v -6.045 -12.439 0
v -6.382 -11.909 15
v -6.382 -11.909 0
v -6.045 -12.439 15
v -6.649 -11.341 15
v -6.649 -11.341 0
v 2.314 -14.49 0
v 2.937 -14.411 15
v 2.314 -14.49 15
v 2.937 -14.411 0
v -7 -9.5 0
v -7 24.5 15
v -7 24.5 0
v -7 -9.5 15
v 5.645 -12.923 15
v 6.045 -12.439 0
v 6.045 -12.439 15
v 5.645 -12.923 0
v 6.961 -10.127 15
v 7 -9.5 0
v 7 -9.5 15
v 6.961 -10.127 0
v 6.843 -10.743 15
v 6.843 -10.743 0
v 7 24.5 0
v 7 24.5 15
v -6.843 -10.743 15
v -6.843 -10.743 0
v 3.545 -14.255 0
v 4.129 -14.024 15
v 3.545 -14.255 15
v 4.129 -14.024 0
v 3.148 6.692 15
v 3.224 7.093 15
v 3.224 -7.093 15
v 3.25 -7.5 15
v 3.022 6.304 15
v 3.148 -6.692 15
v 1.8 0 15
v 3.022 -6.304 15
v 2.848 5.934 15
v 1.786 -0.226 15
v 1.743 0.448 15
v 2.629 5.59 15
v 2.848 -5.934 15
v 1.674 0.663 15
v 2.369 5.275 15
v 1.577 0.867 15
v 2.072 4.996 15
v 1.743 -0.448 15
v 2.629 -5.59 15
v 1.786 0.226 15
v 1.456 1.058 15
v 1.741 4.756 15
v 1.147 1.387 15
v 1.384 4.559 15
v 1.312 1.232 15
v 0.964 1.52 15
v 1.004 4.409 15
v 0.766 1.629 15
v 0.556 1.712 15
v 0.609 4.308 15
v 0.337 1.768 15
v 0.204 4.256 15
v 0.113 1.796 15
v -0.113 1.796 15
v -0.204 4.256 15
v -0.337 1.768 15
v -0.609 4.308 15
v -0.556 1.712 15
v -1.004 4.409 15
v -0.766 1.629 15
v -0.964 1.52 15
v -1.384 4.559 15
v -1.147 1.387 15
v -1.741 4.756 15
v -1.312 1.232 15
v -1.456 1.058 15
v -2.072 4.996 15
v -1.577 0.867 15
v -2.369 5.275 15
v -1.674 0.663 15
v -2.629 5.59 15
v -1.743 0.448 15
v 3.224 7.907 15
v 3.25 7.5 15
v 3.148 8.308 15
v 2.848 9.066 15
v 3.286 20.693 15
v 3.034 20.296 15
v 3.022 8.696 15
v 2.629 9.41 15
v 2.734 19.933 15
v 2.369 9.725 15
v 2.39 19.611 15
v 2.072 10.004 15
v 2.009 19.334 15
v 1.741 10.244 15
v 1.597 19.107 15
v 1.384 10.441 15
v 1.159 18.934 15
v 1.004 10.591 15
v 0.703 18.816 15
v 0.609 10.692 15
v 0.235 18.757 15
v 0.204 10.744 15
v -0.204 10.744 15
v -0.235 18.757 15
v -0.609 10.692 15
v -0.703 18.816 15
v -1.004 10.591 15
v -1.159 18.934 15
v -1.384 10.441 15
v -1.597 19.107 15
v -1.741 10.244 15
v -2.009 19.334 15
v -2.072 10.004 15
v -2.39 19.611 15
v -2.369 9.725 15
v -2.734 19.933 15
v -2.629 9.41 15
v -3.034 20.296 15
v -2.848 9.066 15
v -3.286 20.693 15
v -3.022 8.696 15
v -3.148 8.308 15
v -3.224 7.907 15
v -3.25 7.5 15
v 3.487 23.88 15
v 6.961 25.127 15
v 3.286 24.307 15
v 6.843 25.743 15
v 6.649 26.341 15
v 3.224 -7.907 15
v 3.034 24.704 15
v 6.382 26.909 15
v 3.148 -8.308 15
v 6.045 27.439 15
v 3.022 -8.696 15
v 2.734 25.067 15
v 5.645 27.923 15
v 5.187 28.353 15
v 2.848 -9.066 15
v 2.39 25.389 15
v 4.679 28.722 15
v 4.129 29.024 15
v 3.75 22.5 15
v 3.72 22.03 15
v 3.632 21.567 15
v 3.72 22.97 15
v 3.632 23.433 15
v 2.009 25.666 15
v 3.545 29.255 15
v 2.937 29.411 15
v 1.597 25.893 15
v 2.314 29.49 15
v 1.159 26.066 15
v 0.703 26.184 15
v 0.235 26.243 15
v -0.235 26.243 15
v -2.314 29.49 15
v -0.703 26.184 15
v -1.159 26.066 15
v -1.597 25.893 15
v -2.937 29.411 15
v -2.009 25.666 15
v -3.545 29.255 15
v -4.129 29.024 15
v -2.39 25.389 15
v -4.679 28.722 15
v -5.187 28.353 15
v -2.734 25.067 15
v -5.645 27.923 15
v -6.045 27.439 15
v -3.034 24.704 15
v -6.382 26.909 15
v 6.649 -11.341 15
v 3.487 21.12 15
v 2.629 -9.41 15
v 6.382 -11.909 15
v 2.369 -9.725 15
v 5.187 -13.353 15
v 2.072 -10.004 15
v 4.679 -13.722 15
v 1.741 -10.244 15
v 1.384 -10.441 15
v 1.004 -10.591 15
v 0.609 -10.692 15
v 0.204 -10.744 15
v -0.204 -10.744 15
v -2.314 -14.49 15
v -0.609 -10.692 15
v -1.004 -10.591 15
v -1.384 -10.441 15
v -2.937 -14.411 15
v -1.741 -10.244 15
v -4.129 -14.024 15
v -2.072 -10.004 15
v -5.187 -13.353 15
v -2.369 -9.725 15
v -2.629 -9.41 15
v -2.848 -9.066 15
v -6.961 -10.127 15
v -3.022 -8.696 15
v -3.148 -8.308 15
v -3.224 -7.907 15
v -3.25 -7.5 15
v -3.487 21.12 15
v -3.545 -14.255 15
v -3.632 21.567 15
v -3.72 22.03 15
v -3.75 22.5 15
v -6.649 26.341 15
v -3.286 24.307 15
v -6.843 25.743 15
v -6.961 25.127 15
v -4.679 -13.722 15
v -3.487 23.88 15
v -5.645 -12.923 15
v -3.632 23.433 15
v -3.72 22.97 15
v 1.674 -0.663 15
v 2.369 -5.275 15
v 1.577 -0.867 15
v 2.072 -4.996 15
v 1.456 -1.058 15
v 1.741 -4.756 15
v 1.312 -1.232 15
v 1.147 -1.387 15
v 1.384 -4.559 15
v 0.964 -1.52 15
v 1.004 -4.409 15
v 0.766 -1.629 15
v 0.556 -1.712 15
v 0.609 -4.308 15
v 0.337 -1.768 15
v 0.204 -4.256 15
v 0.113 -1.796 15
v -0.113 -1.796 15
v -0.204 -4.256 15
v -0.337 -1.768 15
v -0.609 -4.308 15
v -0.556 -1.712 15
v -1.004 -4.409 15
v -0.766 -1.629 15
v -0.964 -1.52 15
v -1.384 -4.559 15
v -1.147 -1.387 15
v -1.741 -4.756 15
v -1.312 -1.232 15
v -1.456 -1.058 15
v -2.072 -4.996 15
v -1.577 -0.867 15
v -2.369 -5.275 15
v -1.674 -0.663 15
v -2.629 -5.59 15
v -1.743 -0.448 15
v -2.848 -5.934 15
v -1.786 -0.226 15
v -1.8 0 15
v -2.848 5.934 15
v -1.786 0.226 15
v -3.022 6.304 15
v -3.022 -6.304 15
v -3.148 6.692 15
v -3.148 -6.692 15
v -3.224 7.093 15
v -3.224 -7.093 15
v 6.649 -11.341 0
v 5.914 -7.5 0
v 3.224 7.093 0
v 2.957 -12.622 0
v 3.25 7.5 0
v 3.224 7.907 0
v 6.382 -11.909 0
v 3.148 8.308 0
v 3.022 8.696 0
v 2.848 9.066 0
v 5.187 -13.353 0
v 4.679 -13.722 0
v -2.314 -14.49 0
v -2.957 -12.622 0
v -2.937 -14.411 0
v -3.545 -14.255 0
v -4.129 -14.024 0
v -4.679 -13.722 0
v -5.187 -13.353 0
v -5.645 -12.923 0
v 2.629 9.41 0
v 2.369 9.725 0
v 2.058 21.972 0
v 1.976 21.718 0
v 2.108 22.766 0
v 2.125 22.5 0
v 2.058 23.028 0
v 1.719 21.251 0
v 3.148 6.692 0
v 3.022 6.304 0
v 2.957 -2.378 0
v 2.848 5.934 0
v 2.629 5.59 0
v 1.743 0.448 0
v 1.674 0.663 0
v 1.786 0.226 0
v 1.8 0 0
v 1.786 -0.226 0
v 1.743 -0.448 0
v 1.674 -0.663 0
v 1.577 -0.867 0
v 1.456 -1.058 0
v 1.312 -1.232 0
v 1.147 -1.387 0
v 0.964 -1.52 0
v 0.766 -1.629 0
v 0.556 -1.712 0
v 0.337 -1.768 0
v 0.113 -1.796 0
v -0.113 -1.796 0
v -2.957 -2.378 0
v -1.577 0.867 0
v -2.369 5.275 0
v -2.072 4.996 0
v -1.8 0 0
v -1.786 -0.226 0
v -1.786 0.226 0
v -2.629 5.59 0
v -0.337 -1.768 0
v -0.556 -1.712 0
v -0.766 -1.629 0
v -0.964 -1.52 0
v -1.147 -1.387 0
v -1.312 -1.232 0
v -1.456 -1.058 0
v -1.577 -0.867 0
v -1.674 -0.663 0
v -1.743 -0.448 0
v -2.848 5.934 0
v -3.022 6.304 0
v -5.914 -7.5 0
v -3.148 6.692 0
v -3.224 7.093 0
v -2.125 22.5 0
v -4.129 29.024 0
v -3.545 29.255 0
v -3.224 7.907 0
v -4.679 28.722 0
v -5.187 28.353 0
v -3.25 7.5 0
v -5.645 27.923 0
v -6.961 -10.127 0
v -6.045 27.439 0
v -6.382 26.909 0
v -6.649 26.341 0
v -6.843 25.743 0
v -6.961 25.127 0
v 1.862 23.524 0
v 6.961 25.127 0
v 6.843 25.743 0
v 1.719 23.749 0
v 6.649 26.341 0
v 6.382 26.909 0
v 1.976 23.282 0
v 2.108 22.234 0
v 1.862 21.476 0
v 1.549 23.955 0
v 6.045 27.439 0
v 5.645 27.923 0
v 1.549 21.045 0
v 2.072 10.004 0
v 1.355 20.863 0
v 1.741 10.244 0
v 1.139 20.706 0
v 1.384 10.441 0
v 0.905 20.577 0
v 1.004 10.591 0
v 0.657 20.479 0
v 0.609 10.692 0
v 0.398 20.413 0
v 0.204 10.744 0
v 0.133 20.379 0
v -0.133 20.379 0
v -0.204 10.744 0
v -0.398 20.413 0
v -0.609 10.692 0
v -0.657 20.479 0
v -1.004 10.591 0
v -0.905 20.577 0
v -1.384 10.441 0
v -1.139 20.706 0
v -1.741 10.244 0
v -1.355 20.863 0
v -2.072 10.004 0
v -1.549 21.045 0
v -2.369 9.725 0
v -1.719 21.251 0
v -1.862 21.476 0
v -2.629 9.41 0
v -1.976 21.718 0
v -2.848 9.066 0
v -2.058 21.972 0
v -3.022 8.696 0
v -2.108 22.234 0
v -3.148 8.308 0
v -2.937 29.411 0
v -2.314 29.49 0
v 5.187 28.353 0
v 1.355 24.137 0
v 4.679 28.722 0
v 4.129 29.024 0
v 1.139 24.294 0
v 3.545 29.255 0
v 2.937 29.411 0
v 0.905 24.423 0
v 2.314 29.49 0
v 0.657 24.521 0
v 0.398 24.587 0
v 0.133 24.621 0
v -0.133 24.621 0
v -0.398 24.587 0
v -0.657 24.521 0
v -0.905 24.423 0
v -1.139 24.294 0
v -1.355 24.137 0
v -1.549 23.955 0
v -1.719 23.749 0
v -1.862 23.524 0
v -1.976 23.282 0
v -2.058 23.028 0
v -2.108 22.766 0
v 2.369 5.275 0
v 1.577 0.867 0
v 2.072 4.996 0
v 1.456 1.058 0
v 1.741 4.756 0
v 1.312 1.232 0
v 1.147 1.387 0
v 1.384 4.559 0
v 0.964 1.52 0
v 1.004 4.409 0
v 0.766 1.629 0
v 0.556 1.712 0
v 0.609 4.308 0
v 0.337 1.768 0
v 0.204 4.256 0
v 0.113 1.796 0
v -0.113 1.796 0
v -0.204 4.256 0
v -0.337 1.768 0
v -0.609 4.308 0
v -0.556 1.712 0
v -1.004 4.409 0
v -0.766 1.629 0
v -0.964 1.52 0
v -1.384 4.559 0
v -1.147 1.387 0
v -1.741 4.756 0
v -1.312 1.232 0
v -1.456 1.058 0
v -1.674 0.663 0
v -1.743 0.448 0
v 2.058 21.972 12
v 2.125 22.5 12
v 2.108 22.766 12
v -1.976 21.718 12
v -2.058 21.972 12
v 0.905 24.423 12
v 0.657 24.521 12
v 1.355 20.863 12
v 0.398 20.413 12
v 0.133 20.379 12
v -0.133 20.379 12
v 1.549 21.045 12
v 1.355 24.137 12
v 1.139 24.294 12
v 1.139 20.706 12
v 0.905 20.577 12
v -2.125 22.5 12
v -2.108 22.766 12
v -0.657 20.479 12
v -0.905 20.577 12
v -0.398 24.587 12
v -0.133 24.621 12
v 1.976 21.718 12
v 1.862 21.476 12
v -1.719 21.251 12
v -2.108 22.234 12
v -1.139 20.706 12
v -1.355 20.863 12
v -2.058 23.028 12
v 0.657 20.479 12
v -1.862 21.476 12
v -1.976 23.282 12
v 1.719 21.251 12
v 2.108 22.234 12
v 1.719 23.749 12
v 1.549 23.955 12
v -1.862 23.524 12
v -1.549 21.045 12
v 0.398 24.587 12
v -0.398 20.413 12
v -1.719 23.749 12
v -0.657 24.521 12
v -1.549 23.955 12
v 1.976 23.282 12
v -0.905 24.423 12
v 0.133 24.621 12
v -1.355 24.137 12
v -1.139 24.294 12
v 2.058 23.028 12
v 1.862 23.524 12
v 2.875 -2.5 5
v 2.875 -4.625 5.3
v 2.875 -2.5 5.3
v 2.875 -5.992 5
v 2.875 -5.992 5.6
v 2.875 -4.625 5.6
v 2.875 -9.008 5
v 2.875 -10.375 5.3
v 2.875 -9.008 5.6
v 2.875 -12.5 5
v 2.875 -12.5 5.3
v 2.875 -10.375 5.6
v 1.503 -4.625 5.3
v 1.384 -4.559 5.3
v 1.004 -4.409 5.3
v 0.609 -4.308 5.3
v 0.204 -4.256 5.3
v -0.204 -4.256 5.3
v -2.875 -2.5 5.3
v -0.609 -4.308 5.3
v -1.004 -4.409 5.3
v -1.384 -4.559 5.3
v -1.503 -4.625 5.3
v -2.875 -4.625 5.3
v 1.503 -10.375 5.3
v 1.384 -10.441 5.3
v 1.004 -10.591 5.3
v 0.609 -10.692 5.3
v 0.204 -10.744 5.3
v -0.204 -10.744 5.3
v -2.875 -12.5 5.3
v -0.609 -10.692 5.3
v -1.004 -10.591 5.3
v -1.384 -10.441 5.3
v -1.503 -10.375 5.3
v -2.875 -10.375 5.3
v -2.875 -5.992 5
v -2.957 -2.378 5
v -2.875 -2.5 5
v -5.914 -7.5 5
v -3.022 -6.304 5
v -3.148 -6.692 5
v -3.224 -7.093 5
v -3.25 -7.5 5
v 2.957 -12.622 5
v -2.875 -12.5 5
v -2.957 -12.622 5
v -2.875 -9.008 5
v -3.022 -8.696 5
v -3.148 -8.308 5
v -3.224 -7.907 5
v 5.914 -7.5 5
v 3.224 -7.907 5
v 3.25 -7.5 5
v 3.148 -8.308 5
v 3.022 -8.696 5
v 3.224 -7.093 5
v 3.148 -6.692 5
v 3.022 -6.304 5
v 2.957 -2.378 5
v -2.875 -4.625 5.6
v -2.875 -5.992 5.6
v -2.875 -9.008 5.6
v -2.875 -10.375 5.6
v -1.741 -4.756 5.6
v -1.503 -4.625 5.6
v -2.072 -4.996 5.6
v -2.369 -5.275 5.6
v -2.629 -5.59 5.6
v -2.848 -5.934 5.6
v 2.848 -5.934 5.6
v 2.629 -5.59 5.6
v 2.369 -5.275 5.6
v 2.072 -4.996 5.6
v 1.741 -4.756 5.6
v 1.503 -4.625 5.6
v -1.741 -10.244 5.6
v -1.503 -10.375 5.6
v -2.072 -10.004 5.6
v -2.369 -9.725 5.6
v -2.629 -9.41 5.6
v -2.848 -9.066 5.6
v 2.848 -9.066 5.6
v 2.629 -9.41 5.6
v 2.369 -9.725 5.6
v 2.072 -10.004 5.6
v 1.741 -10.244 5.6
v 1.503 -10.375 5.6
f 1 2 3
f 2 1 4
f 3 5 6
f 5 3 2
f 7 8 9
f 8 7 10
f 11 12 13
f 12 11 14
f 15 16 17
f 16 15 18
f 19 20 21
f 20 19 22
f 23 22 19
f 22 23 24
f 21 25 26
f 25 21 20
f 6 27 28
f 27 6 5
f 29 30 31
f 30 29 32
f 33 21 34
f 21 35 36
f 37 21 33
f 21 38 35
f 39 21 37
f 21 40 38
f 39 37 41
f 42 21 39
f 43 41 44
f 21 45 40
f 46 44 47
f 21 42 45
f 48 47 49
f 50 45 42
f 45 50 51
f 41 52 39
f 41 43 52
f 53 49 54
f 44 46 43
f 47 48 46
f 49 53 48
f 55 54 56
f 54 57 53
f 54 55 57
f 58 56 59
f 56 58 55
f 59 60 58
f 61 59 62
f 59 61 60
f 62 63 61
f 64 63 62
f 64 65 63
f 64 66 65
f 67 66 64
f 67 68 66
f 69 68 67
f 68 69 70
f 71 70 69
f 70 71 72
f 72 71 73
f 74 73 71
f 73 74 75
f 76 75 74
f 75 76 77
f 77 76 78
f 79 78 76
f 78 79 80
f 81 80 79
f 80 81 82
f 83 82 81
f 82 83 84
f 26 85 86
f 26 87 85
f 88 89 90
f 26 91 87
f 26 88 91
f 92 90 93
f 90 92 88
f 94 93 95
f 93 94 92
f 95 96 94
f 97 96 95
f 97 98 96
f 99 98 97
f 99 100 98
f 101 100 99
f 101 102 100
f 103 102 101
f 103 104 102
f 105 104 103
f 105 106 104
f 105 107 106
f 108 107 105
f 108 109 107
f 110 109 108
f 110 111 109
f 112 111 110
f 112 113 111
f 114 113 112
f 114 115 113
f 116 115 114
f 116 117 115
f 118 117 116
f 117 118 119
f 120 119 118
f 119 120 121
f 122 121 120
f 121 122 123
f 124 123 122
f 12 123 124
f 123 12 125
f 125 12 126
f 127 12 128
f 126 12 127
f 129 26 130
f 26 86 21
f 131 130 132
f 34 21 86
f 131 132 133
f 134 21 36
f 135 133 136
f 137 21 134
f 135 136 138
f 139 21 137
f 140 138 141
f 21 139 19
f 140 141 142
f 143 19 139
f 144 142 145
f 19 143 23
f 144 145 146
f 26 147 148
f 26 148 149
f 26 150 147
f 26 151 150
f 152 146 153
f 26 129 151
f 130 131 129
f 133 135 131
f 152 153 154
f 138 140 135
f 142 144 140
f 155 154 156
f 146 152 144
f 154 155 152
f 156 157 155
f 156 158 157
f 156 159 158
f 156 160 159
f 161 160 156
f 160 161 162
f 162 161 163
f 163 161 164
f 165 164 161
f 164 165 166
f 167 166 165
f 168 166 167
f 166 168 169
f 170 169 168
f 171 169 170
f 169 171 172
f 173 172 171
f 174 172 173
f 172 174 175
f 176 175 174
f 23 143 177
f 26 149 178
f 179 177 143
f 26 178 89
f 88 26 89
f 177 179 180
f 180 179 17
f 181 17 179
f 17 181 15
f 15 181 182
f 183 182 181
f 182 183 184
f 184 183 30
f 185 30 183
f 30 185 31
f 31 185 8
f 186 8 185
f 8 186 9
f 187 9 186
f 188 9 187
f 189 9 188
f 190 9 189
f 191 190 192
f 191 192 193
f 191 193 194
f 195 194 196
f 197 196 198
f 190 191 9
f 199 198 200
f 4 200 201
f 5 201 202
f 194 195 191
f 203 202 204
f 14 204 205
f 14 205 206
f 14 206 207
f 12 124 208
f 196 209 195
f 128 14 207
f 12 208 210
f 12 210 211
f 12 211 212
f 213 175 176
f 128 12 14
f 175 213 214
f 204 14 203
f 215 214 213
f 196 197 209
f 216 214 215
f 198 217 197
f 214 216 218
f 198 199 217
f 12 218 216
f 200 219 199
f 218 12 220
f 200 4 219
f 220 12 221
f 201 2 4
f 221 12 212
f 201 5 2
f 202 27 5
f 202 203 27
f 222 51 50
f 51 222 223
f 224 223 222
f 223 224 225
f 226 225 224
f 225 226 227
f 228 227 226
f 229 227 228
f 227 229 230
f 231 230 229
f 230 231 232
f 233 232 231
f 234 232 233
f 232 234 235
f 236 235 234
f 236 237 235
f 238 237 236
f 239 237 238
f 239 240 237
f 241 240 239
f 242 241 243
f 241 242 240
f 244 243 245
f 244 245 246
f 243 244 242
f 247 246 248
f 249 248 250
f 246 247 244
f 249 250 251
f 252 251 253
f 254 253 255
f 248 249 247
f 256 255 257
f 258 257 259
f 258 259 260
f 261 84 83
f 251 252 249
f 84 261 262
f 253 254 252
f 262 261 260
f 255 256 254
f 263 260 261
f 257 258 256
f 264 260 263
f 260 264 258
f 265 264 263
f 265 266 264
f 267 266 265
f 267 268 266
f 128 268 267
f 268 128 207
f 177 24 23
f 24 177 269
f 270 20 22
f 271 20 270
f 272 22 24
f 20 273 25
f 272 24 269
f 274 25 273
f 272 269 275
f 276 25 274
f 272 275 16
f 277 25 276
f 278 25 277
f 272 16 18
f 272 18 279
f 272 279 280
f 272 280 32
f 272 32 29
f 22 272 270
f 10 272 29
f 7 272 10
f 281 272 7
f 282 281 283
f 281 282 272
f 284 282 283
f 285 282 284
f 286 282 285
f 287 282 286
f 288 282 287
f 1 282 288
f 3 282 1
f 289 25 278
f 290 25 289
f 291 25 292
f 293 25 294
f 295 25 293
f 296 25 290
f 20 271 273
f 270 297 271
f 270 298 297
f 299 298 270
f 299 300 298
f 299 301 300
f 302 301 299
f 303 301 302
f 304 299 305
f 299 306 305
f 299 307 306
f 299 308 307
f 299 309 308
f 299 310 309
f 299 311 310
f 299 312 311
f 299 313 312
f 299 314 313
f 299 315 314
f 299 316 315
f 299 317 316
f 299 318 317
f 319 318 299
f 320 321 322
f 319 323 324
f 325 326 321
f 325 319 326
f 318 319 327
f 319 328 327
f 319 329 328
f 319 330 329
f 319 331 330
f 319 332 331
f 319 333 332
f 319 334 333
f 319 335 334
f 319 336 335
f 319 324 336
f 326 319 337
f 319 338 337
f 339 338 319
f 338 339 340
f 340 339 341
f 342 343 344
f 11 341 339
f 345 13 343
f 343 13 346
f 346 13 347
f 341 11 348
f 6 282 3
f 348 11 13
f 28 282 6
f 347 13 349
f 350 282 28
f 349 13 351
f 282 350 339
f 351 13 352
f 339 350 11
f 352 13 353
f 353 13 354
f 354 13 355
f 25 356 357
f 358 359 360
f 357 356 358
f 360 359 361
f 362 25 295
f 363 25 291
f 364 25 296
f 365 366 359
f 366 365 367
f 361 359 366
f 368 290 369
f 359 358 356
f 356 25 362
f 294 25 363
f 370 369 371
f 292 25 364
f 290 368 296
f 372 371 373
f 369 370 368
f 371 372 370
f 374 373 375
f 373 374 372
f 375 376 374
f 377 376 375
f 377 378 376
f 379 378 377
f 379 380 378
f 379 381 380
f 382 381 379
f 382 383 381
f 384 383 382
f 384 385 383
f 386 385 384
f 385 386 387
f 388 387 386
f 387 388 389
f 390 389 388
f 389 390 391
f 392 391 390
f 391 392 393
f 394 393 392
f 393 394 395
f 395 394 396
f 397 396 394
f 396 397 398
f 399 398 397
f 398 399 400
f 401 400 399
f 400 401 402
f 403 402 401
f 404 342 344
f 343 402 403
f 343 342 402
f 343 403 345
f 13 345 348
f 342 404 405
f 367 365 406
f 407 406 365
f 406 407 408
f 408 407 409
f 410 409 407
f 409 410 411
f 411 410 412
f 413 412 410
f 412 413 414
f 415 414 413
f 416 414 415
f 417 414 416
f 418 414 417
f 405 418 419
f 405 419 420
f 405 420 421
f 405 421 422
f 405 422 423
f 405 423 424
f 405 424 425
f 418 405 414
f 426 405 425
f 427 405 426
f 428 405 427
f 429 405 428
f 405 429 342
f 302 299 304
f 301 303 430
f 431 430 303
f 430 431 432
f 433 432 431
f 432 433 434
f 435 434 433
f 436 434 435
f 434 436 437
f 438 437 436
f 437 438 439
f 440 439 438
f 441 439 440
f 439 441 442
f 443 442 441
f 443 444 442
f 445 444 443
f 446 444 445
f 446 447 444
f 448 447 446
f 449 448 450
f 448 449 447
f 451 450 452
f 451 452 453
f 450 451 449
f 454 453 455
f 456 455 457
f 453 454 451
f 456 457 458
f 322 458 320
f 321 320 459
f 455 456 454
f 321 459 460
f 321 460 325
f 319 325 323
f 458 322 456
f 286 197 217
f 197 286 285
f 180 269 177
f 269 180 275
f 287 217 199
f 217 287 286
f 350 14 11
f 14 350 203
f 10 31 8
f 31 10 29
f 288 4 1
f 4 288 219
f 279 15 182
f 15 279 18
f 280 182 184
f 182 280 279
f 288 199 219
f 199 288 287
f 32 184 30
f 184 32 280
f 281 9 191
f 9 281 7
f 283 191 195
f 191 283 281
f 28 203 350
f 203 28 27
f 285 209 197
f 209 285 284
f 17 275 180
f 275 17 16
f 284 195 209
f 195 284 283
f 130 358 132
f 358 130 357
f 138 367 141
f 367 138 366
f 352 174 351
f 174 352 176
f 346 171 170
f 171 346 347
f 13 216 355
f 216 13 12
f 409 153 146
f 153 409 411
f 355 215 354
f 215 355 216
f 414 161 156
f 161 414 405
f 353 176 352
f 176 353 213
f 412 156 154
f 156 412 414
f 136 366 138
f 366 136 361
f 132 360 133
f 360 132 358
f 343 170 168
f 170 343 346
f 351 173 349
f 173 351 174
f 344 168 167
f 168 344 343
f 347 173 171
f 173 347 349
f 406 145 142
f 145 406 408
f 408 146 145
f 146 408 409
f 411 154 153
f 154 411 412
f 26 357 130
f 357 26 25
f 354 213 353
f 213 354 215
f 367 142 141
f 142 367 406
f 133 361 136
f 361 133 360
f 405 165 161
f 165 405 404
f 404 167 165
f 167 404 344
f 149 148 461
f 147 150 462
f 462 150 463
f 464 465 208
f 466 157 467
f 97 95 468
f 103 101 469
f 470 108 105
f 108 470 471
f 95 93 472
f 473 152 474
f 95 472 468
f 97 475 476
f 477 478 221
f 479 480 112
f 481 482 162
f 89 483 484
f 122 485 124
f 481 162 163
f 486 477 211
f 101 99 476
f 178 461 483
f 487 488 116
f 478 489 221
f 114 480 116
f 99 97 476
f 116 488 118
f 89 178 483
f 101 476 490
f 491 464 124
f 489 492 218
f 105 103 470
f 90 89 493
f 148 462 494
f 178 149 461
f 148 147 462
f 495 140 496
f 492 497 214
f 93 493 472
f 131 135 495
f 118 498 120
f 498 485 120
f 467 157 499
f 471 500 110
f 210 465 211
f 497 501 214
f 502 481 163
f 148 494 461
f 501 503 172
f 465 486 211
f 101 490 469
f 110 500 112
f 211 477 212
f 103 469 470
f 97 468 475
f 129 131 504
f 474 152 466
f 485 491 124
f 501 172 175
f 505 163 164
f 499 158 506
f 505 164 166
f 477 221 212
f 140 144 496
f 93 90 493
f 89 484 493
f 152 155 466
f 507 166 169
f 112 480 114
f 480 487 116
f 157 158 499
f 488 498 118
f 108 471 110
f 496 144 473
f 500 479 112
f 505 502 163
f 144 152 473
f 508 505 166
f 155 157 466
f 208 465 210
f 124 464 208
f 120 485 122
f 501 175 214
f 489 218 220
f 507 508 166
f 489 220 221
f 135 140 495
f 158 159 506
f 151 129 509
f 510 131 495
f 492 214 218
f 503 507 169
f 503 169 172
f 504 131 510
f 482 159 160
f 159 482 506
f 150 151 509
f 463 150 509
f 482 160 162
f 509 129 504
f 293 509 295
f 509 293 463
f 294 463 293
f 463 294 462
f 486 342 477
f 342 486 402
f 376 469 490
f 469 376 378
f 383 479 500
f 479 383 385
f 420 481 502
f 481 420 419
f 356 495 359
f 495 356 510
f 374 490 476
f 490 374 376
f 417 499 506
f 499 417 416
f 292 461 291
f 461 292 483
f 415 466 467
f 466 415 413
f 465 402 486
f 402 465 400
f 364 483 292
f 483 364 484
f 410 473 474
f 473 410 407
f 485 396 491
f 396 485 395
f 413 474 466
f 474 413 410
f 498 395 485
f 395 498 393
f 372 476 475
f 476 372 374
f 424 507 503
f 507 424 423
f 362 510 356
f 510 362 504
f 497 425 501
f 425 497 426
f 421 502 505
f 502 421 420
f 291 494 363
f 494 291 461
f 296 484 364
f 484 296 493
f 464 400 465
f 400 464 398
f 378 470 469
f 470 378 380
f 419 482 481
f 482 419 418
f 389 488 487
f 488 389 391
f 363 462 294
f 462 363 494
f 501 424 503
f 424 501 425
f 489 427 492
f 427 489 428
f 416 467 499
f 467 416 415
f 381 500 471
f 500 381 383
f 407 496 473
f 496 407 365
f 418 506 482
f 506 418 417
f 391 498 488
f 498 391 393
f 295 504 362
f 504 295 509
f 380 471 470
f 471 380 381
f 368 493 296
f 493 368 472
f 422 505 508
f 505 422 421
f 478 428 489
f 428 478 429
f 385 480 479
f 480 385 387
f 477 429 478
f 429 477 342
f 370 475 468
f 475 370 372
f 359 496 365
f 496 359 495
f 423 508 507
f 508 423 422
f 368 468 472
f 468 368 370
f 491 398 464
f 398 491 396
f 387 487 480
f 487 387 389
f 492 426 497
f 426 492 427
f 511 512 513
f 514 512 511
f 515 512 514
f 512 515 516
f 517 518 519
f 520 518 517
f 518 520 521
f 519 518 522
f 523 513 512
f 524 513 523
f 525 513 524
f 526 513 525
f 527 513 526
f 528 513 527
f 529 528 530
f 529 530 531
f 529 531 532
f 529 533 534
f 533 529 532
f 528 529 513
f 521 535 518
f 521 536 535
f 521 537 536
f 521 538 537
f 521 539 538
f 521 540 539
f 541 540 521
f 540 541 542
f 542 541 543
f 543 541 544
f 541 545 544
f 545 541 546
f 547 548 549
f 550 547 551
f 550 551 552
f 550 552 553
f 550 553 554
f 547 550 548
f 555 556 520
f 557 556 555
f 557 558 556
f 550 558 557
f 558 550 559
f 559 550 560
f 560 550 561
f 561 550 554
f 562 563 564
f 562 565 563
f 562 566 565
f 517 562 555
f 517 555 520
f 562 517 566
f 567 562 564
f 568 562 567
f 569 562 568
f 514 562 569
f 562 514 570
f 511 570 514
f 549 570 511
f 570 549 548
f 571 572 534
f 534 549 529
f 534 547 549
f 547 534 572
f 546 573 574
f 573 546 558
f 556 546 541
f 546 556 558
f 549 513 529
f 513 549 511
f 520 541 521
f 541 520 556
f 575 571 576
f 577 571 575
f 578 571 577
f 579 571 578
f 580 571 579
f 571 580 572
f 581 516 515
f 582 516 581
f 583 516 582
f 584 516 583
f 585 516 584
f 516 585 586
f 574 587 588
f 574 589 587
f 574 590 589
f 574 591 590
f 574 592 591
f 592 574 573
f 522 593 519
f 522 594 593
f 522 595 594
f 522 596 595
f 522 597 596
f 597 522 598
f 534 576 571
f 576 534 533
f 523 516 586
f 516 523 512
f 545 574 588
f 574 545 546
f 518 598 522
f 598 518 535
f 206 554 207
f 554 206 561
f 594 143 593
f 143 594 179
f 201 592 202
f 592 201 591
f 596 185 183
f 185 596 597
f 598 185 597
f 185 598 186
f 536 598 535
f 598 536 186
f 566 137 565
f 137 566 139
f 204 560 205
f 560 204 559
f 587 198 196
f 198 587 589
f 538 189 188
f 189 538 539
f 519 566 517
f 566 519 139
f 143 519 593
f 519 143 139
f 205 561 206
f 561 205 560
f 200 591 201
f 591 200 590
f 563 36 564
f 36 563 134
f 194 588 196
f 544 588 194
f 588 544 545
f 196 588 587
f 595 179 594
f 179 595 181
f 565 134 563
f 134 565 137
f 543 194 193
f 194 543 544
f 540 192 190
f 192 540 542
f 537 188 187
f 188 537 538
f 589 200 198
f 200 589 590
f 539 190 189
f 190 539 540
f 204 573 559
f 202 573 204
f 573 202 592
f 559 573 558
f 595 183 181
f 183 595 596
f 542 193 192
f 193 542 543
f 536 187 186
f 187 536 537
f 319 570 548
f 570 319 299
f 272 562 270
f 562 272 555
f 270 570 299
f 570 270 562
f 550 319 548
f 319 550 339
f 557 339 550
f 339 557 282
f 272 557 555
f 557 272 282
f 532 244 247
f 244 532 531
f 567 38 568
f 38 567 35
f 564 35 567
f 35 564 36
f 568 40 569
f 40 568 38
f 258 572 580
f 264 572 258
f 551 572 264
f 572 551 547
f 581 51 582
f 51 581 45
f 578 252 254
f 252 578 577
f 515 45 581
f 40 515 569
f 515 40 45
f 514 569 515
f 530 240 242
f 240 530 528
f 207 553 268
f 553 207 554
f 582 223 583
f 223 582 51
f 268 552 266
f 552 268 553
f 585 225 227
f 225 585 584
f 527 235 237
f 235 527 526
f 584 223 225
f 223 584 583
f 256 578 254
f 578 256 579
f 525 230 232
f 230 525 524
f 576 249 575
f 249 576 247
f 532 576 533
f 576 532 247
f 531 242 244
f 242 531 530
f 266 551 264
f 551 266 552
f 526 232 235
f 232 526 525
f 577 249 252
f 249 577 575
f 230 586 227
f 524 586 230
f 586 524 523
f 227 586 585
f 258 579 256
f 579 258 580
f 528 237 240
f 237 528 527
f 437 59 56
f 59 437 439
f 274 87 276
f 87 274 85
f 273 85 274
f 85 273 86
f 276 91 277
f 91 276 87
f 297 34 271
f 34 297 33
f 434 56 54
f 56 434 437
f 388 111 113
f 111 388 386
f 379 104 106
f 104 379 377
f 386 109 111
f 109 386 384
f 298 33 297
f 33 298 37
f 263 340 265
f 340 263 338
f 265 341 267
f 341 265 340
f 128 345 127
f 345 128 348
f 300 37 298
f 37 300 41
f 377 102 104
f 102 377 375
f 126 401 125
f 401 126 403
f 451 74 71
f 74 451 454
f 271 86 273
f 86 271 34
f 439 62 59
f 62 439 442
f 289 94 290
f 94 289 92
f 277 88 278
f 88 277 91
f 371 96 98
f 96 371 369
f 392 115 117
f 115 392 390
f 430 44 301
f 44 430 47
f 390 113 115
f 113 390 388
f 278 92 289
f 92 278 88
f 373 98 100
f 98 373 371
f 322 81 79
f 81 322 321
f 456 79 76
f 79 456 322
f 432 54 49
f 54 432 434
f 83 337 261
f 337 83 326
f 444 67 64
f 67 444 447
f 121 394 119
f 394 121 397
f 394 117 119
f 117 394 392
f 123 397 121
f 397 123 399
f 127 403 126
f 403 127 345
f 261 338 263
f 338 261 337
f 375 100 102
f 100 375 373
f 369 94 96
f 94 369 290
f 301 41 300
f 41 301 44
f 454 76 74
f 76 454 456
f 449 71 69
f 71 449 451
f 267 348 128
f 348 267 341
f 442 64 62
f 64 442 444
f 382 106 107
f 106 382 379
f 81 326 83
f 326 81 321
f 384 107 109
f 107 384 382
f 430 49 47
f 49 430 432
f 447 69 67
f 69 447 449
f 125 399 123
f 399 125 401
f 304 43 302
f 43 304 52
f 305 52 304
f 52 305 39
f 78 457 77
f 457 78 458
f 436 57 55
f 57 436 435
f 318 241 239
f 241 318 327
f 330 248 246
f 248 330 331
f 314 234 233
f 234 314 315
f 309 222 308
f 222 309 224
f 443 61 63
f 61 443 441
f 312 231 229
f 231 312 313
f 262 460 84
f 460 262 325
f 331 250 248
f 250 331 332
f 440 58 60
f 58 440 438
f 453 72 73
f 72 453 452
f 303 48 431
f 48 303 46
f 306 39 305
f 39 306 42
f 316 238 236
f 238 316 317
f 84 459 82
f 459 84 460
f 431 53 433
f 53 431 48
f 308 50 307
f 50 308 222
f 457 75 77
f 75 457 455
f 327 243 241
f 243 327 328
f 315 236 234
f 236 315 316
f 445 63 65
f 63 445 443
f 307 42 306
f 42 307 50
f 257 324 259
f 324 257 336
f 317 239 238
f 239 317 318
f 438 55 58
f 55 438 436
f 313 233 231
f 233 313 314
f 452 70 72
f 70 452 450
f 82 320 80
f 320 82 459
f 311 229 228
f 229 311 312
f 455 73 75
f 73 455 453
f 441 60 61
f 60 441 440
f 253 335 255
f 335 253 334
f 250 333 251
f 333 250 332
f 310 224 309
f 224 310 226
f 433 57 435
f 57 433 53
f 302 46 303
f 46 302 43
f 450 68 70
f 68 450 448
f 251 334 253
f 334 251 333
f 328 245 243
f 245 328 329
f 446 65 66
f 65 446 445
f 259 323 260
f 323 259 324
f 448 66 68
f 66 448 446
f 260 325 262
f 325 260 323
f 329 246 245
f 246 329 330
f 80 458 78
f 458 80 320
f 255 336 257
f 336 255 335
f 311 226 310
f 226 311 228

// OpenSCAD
$fn = 50;


difference() {
	union() {
		hull() {
			translate(v = [-2.0000000000, 9.5000000000, 0]) {
				cylinder(h = 15, r = 5);
			}
			translate(v = [2.0000000000, 9.5000000000, 0]) {
				cylinder(h = 15, r = 5);
			}
			translate(v = [-2.0000000000, -9.5000000000, 0]) {
				cylinder(h = 15, r = 5);
			}
			translate(v = [2.0000000000, -9.5000000000, 0]) {
				cylinder(h = 15, r = 5);
			}
		}
		translate(v = [0.0000000000, 15.0000000000, 0]) {
			hull() {
				translate(v = [-2.0000000000, 9.5000000000, 0]) {
					cylinder(h = 15, r = 5);
				}
				translate(v = [2.0000000000, 9.5000000000, 0]) {
					cylinder(h = 15, r = 5);
				}
				translate(v = [-2.0000000000, -9.5000000000, 0]) {
					cylinder(h = 15, r = 5);
				}
				translate(v = [2.0000000000, -9.5000000000, 0]) {
					cylinder(h = 15, r = 5);
				}
			}
		}
		translate(v = [0.0000000000, 15.0000000000, 0]) {
			hull() {
				translate(v = [-2.0000000000, 9.5000000000, 0]) {
					cylinder(h = 15, r = 5);
				}
				translate(v = [2.0000000000, 9.5000000000, 0]) {
					cylinder(h = 15, r = 5);
				}
				translate(v = [-2.0000000000, -9.5000000000, 0]) {
					cylinder(h = 15, r = 5);
				}
				translate(v = [2.0000000000, -9.5000000000, 0]) {
					cylinder(h = 15, r = 5);
				}
			}
		}
	}
	union() {
		translate(v = [0.0000000000, 22.5000000000, 15]) {
			rotate(a = [0, 0, 0]) {
				difference() {
					union() {
						#translate(v = [0, 0, -15.0000000000]) {
							cylinder(h = 15, r = 2.0000000000);
						}
						#translate(v = [0, 0, -3]) {
							cylinder(h = 3, r1 = 2.1250000000, r2 = 3.7500000000);
						}
						#translate(v = [0, 0, -15.0000000000]) {
							cylinder(h = 15, r = 2.1250000000);
						}
						#translate(v = [0, 0, -15.0000000000]) {
							cylinder(h = 15, r = 2.0000000000);
						}
					}
					union();
				}
			}
		}
		translate(v = [0.0000000000, 22.5000000000, 15]) {
			rotate(a = [0, 0, 0]) {
				difference() {
					union() {
						#translate(v = [0, 0, -15.0000000000]) {
							cylinder(h = 15, r = 2.0000000000);
						}
						#translate(v = [0, 0, -3]) {
							cylinder(h = 3, r1 = 2.1250000000, r2 = 3.7500000000);
						}
						#translate(v = [0, 0, -15.0000000000]) {
							cylinder(h = 15, r = 2.1250000000);
						}
						#translate(v = [0, 0, -15.0000000000]) {
							cylinder(h = 15, r = 2.0000000000);
						}
					}
					union();
				}
			}
		}
		translate(v = [0.0000000000, -7.5000000000, 0]) {
			rotate(a = [0, 0, 0]) {
				difference() {
					union() {
						#translate(v = [-2.8750000000, -5.0000000000, -0.3000000000]) {
							cube(size = [5.7500000000, 10, 0.3000000000]);
						}
						#translate(v = [-2.8750000000, -2.8750000000, -0.6000000000]) {
							cube(size = [5.7500000000, 5.7500000000, 0.3000000000]);
						}
						#translate(v = [-2.8750000000, -5.0000000000, 5]) {
							cube(size = [5.7500000000, 10, 0.3000000000]);
						}
						#translate(v = [-2.8750000000, -2.8750000000, 5.3000000000]) {
							cube(size = [5.7500000000, 5.7500000000, 0.3000000000]);
						}
						#translate(v = [0, 0, -100.0000000000]) {
							cylinder(h = 200, r = 3.2500000000);
						}
						#linear_extrude(height = 5) {
							polygon(points = [[5.9142500000, 0.0000000000], [2.9571250000, 5.1218907443], [-2.9571250000, 5.1218907443], [-5.9142500000, 0.0000000000], [-2.9571250000, -5.1218907443], [2.9571250000, -5.1218907443]]);
						}
						#translate(v = [-2.8750000000, -5.0000000000, -0.3000000000]) {
							cube(size = [5.7500000000, 10, 0.3000000000]);
						}
						#translate(v = [-2.8750000000, -2.8750000000, -0.6000000000]) {
							cube(size = [5.7500000000, 5.7500000000, 0.3000000000]);
						}
						#translate(v = [-2.8750000000, -5.0000000000, 5]) {
							cube(size = [5.7500000000, 10, 0.3000000000]);
						}
						#translate(v = [-2.8750000000, -2.8750000000, 5.3000000000]) {
							cube(size = [5.7500000000, 5.7500000000, 0.3000000000]);
						}
						#translate(v = [0, 0, -100.0000000000]) {
							cylinder(h = 200, r = 3.2500000000);
						}
						#translate(v = [-2.8750000000, -5.0000000000, -0.3000000000]) {
							cube(size = [5.7500000000, 10, 0.3000000000]);
						}
						#translate(v = [-2.8750000000, -2.8750000000, -0.6000000000]) {
							cube(size = [5.7500000000, 5.7500000000, 0.3000000000]);
						}
						#translate(v = [-2.8750000000, -5.0000000000, 5]) {
							cube(size = [5.7500000000, 10, 0.3000000000]);
						}
						#translate(v = [-2.8750000000, -2.8750000000, 5.3000000000]) {
							cube(size = [5.7500000000, 5.7500000000, 0.3000000000]);
						}
						#translate(v = [0, 0, -100.0000000000]) {
							cylinder(h = 200, r = 3.2500000000);
						}
					}
					union();
				}
			}
		}
		translate(v = [0.0000000000, -7.5000000000, 0]) {
			translate(v = [0, 0, -100]) {
				cylinder(h = 200, r = 3.2500000000);
			}
		}
		translate(v = [0.0000000000, 7.5000000000, 0]) {
			translate(v = [0, 0, -100]) {
				cylinder(h = 200, r = 3.2500000000);
			}
		}
		translate(v = [0.0000000000, -7.5000000000, 0]) {
			translate(v = [0, 0, -100]) {
				cylinder(h = 200, r = 1.8000000000);
			}
		}
		translate(v = [0, 0, -100]) {
			cylinder(h = 200, r = 1.8000000000);
		}
		translate(v = [0.0000000000, 7.5000000000, 0]) {
			translate(v = [0, 0, -100]) {
				cylinder(h = 200, r = 1.8000000000);
			}
		}
	}
}
